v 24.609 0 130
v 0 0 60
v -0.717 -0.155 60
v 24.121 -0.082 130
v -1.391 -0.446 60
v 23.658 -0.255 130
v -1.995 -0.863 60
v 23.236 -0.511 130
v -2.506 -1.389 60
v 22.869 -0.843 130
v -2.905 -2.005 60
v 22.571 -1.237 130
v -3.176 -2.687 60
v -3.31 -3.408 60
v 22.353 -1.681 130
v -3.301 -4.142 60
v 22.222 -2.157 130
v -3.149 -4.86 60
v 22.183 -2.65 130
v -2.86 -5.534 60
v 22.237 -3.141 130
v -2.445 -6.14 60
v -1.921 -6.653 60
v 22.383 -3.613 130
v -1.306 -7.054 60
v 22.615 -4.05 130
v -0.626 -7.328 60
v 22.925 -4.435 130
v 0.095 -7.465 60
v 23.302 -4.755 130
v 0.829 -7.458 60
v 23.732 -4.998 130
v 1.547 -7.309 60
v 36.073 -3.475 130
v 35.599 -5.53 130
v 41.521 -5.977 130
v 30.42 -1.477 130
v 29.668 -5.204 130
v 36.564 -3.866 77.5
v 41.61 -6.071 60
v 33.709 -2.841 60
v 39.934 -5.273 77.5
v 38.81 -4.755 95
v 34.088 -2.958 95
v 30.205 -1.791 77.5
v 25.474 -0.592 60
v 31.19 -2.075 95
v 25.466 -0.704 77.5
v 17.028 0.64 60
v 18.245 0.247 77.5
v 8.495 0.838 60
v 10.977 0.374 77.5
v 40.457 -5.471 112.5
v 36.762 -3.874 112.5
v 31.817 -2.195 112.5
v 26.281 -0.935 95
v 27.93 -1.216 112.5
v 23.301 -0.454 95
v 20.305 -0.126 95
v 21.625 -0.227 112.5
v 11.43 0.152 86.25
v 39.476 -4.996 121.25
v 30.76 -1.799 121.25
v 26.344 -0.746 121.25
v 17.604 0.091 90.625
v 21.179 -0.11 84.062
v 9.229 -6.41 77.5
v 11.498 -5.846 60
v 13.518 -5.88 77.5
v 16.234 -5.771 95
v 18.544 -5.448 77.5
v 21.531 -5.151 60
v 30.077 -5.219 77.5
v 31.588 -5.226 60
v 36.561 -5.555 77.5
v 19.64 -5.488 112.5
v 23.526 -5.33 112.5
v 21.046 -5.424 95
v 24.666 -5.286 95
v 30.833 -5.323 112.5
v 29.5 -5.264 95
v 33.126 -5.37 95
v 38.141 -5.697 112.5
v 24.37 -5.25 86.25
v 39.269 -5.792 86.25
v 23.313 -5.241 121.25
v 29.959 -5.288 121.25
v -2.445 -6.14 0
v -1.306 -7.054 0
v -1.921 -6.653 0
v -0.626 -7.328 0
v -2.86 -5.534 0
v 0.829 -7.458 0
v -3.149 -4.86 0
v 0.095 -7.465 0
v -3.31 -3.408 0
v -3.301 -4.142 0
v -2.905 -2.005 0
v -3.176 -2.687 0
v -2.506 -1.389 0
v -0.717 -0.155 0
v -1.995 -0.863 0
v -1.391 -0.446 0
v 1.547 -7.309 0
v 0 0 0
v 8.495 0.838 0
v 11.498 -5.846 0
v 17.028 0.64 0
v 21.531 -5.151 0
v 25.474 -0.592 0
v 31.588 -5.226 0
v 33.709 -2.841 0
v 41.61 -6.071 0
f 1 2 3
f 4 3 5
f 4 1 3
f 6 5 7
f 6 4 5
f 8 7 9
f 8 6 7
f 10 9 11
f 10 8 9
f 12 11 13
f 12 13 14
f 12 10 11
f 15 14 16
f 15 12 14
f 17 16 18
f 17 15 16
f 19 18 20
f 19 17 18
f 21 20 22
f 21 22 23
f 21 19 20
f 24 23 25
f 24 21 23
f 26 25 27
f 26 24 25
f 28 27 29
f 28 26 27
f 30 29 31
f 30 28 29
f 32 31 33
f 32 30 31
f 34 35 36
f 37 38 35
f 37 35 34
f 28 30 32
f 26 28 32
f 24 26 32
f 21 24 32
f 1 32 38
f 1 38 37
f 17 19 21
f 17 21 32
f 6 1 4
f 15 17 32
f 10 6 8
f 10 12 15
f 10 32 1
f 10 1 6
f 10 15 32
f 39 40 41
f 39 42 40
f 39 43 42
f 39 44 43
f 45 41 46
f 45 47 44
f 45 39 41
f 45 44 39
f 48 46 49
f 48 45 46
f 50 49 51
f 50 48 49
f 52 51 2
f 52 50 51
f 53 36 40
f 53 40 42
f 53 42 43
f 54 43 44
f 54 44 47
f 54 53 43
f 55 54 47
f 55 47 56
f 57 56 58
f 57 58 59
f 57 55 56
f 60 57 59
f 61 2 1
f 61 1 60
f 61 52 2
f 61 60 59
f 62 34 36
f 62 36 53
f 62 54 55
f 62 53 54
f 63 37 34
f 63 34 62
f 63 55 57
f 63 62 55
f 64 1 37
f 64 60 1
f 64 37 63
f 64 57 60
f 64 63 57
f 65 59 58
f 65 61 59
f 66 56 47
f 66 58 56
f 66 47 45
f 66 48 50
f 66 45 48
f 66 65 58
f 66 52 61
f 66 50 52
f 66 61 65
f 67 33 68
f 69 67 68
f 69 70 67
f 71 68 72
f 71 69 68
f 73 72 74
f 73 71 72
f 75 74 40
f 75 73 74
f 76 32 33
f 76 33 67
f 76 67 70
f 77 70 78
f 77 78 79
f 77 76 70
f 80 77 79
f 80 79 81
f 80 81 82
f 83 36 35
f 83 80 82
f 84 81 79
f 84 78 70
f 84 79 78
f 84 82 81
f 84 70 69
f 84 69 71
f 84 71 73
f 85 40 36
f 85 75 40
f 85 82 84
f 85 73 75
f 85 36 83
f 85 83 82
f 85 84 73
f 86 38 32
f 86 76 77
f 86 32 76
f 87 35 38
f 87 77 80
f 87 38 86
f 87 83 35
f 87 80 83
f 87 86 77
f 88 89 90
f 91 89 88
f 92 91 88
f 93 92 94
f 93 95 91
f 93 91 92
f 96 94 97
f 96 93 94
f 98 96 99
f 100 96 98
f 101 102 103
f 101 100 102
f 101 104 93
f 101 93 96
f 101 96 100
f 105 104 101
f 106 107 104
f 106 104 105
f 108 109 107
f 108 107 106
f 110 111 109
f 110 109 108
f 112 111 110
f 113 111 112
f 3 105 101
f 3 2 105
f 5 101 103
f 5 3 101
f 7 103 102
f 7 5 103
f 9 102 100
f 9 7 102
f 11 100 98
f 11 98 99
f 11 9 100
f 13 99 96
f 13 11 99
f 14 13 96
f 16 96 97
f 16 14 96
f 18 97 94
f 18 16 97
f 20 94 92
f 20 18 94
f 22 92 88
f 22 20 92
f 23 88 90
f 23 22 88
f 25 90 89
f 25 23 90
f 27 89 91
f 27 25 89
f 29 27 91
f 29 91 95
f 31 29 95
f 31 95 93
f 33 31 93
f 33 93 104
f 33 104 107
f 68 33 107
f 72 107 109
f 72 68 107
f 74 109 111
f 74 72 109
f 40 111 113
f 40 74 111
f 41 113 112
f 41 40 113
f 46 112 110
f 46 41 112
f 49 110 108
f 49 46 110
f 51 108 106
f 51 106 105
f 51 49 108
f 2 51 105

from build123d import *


with BuildPart() as f4:
    # F0 (on Top) → F4 section 0
    with BuildSketch(Plane.XY):
        with BuildLine():
            ThreePointArc((1.5474857793, -7.3085332362), (21.5310263119, -5.1508726081), (41.6096189935, -6.0714743331))
            ThreePointArc((41.6096189935, -6.0714743331), (21.2699883307, 0.1522717061), (0, 0))
            ThreePointArc((0, 0), (-3.2423450763, -4.5046204189), (1.5474857793, -7.3085332362))
        make_face()
    # F2 (on offset) → F4 section 1
    with BuildSketch(Plane.XY.offset(60)):
        with BuildLine():
            ThreePointArc((41.6096189935, -6.0714743331), (21.2699883307, 0.1522717061), (0, 0))
            ThreePointArc((0, 0), (-3.2423450763, -4.5046204189), (1.5474857793, -7.3085332362))
            ThreePointArc((1.5474857793, -7.3085332362), (21.5310263119, -5.1508726081), (41.6096189935, -6.0714743331))
        make_face()
    loft()

    # F4_face (on face) → F6 section 0
    with BuildSketch(Plane(origin=(14.0442099137, -3.0045587038, 60), x_dir=(1, 0, 0), z_dir=(0, 0, 1))):
        with BuildLine():
            ThreePointArc((-14.0442099137, 3.0045587038), (-17.28655499, -1.5000617151), (-12.4967241344, -4.3039745324))
            ThreePointArc((-12.4967241344, -4.3039745324), (7.4868163983, -2.1463139043), (27.5654090798, -3.0669156292))
            ThreePointArc((27.5654090798, -3.0669156292), (7.225778417, 3.1568304099), (-14.0442099137, 3.0045587038))
        make_face()
    # F5 (on offset) → F6 section 1
    with BuildSketch(Plane.XY.offset(130)):
        with BuildLine():
            ThreePointArc((23.7320419401, -4.9977814779), (32.6341024887, -5.3520079811), (41.5212251246, -5.97747555))
            ThreePointArc((41.5212251246, -5.97747555), (33.2689677889, -2.4114002007), (24.6086101979, 0))
            ThreePointArc((24.6086101979, 0), (22.2217339207, -2.1571242907), (23.7320419401, -4.9977814779))
        make_face()
    loft()


solid = f4.part
